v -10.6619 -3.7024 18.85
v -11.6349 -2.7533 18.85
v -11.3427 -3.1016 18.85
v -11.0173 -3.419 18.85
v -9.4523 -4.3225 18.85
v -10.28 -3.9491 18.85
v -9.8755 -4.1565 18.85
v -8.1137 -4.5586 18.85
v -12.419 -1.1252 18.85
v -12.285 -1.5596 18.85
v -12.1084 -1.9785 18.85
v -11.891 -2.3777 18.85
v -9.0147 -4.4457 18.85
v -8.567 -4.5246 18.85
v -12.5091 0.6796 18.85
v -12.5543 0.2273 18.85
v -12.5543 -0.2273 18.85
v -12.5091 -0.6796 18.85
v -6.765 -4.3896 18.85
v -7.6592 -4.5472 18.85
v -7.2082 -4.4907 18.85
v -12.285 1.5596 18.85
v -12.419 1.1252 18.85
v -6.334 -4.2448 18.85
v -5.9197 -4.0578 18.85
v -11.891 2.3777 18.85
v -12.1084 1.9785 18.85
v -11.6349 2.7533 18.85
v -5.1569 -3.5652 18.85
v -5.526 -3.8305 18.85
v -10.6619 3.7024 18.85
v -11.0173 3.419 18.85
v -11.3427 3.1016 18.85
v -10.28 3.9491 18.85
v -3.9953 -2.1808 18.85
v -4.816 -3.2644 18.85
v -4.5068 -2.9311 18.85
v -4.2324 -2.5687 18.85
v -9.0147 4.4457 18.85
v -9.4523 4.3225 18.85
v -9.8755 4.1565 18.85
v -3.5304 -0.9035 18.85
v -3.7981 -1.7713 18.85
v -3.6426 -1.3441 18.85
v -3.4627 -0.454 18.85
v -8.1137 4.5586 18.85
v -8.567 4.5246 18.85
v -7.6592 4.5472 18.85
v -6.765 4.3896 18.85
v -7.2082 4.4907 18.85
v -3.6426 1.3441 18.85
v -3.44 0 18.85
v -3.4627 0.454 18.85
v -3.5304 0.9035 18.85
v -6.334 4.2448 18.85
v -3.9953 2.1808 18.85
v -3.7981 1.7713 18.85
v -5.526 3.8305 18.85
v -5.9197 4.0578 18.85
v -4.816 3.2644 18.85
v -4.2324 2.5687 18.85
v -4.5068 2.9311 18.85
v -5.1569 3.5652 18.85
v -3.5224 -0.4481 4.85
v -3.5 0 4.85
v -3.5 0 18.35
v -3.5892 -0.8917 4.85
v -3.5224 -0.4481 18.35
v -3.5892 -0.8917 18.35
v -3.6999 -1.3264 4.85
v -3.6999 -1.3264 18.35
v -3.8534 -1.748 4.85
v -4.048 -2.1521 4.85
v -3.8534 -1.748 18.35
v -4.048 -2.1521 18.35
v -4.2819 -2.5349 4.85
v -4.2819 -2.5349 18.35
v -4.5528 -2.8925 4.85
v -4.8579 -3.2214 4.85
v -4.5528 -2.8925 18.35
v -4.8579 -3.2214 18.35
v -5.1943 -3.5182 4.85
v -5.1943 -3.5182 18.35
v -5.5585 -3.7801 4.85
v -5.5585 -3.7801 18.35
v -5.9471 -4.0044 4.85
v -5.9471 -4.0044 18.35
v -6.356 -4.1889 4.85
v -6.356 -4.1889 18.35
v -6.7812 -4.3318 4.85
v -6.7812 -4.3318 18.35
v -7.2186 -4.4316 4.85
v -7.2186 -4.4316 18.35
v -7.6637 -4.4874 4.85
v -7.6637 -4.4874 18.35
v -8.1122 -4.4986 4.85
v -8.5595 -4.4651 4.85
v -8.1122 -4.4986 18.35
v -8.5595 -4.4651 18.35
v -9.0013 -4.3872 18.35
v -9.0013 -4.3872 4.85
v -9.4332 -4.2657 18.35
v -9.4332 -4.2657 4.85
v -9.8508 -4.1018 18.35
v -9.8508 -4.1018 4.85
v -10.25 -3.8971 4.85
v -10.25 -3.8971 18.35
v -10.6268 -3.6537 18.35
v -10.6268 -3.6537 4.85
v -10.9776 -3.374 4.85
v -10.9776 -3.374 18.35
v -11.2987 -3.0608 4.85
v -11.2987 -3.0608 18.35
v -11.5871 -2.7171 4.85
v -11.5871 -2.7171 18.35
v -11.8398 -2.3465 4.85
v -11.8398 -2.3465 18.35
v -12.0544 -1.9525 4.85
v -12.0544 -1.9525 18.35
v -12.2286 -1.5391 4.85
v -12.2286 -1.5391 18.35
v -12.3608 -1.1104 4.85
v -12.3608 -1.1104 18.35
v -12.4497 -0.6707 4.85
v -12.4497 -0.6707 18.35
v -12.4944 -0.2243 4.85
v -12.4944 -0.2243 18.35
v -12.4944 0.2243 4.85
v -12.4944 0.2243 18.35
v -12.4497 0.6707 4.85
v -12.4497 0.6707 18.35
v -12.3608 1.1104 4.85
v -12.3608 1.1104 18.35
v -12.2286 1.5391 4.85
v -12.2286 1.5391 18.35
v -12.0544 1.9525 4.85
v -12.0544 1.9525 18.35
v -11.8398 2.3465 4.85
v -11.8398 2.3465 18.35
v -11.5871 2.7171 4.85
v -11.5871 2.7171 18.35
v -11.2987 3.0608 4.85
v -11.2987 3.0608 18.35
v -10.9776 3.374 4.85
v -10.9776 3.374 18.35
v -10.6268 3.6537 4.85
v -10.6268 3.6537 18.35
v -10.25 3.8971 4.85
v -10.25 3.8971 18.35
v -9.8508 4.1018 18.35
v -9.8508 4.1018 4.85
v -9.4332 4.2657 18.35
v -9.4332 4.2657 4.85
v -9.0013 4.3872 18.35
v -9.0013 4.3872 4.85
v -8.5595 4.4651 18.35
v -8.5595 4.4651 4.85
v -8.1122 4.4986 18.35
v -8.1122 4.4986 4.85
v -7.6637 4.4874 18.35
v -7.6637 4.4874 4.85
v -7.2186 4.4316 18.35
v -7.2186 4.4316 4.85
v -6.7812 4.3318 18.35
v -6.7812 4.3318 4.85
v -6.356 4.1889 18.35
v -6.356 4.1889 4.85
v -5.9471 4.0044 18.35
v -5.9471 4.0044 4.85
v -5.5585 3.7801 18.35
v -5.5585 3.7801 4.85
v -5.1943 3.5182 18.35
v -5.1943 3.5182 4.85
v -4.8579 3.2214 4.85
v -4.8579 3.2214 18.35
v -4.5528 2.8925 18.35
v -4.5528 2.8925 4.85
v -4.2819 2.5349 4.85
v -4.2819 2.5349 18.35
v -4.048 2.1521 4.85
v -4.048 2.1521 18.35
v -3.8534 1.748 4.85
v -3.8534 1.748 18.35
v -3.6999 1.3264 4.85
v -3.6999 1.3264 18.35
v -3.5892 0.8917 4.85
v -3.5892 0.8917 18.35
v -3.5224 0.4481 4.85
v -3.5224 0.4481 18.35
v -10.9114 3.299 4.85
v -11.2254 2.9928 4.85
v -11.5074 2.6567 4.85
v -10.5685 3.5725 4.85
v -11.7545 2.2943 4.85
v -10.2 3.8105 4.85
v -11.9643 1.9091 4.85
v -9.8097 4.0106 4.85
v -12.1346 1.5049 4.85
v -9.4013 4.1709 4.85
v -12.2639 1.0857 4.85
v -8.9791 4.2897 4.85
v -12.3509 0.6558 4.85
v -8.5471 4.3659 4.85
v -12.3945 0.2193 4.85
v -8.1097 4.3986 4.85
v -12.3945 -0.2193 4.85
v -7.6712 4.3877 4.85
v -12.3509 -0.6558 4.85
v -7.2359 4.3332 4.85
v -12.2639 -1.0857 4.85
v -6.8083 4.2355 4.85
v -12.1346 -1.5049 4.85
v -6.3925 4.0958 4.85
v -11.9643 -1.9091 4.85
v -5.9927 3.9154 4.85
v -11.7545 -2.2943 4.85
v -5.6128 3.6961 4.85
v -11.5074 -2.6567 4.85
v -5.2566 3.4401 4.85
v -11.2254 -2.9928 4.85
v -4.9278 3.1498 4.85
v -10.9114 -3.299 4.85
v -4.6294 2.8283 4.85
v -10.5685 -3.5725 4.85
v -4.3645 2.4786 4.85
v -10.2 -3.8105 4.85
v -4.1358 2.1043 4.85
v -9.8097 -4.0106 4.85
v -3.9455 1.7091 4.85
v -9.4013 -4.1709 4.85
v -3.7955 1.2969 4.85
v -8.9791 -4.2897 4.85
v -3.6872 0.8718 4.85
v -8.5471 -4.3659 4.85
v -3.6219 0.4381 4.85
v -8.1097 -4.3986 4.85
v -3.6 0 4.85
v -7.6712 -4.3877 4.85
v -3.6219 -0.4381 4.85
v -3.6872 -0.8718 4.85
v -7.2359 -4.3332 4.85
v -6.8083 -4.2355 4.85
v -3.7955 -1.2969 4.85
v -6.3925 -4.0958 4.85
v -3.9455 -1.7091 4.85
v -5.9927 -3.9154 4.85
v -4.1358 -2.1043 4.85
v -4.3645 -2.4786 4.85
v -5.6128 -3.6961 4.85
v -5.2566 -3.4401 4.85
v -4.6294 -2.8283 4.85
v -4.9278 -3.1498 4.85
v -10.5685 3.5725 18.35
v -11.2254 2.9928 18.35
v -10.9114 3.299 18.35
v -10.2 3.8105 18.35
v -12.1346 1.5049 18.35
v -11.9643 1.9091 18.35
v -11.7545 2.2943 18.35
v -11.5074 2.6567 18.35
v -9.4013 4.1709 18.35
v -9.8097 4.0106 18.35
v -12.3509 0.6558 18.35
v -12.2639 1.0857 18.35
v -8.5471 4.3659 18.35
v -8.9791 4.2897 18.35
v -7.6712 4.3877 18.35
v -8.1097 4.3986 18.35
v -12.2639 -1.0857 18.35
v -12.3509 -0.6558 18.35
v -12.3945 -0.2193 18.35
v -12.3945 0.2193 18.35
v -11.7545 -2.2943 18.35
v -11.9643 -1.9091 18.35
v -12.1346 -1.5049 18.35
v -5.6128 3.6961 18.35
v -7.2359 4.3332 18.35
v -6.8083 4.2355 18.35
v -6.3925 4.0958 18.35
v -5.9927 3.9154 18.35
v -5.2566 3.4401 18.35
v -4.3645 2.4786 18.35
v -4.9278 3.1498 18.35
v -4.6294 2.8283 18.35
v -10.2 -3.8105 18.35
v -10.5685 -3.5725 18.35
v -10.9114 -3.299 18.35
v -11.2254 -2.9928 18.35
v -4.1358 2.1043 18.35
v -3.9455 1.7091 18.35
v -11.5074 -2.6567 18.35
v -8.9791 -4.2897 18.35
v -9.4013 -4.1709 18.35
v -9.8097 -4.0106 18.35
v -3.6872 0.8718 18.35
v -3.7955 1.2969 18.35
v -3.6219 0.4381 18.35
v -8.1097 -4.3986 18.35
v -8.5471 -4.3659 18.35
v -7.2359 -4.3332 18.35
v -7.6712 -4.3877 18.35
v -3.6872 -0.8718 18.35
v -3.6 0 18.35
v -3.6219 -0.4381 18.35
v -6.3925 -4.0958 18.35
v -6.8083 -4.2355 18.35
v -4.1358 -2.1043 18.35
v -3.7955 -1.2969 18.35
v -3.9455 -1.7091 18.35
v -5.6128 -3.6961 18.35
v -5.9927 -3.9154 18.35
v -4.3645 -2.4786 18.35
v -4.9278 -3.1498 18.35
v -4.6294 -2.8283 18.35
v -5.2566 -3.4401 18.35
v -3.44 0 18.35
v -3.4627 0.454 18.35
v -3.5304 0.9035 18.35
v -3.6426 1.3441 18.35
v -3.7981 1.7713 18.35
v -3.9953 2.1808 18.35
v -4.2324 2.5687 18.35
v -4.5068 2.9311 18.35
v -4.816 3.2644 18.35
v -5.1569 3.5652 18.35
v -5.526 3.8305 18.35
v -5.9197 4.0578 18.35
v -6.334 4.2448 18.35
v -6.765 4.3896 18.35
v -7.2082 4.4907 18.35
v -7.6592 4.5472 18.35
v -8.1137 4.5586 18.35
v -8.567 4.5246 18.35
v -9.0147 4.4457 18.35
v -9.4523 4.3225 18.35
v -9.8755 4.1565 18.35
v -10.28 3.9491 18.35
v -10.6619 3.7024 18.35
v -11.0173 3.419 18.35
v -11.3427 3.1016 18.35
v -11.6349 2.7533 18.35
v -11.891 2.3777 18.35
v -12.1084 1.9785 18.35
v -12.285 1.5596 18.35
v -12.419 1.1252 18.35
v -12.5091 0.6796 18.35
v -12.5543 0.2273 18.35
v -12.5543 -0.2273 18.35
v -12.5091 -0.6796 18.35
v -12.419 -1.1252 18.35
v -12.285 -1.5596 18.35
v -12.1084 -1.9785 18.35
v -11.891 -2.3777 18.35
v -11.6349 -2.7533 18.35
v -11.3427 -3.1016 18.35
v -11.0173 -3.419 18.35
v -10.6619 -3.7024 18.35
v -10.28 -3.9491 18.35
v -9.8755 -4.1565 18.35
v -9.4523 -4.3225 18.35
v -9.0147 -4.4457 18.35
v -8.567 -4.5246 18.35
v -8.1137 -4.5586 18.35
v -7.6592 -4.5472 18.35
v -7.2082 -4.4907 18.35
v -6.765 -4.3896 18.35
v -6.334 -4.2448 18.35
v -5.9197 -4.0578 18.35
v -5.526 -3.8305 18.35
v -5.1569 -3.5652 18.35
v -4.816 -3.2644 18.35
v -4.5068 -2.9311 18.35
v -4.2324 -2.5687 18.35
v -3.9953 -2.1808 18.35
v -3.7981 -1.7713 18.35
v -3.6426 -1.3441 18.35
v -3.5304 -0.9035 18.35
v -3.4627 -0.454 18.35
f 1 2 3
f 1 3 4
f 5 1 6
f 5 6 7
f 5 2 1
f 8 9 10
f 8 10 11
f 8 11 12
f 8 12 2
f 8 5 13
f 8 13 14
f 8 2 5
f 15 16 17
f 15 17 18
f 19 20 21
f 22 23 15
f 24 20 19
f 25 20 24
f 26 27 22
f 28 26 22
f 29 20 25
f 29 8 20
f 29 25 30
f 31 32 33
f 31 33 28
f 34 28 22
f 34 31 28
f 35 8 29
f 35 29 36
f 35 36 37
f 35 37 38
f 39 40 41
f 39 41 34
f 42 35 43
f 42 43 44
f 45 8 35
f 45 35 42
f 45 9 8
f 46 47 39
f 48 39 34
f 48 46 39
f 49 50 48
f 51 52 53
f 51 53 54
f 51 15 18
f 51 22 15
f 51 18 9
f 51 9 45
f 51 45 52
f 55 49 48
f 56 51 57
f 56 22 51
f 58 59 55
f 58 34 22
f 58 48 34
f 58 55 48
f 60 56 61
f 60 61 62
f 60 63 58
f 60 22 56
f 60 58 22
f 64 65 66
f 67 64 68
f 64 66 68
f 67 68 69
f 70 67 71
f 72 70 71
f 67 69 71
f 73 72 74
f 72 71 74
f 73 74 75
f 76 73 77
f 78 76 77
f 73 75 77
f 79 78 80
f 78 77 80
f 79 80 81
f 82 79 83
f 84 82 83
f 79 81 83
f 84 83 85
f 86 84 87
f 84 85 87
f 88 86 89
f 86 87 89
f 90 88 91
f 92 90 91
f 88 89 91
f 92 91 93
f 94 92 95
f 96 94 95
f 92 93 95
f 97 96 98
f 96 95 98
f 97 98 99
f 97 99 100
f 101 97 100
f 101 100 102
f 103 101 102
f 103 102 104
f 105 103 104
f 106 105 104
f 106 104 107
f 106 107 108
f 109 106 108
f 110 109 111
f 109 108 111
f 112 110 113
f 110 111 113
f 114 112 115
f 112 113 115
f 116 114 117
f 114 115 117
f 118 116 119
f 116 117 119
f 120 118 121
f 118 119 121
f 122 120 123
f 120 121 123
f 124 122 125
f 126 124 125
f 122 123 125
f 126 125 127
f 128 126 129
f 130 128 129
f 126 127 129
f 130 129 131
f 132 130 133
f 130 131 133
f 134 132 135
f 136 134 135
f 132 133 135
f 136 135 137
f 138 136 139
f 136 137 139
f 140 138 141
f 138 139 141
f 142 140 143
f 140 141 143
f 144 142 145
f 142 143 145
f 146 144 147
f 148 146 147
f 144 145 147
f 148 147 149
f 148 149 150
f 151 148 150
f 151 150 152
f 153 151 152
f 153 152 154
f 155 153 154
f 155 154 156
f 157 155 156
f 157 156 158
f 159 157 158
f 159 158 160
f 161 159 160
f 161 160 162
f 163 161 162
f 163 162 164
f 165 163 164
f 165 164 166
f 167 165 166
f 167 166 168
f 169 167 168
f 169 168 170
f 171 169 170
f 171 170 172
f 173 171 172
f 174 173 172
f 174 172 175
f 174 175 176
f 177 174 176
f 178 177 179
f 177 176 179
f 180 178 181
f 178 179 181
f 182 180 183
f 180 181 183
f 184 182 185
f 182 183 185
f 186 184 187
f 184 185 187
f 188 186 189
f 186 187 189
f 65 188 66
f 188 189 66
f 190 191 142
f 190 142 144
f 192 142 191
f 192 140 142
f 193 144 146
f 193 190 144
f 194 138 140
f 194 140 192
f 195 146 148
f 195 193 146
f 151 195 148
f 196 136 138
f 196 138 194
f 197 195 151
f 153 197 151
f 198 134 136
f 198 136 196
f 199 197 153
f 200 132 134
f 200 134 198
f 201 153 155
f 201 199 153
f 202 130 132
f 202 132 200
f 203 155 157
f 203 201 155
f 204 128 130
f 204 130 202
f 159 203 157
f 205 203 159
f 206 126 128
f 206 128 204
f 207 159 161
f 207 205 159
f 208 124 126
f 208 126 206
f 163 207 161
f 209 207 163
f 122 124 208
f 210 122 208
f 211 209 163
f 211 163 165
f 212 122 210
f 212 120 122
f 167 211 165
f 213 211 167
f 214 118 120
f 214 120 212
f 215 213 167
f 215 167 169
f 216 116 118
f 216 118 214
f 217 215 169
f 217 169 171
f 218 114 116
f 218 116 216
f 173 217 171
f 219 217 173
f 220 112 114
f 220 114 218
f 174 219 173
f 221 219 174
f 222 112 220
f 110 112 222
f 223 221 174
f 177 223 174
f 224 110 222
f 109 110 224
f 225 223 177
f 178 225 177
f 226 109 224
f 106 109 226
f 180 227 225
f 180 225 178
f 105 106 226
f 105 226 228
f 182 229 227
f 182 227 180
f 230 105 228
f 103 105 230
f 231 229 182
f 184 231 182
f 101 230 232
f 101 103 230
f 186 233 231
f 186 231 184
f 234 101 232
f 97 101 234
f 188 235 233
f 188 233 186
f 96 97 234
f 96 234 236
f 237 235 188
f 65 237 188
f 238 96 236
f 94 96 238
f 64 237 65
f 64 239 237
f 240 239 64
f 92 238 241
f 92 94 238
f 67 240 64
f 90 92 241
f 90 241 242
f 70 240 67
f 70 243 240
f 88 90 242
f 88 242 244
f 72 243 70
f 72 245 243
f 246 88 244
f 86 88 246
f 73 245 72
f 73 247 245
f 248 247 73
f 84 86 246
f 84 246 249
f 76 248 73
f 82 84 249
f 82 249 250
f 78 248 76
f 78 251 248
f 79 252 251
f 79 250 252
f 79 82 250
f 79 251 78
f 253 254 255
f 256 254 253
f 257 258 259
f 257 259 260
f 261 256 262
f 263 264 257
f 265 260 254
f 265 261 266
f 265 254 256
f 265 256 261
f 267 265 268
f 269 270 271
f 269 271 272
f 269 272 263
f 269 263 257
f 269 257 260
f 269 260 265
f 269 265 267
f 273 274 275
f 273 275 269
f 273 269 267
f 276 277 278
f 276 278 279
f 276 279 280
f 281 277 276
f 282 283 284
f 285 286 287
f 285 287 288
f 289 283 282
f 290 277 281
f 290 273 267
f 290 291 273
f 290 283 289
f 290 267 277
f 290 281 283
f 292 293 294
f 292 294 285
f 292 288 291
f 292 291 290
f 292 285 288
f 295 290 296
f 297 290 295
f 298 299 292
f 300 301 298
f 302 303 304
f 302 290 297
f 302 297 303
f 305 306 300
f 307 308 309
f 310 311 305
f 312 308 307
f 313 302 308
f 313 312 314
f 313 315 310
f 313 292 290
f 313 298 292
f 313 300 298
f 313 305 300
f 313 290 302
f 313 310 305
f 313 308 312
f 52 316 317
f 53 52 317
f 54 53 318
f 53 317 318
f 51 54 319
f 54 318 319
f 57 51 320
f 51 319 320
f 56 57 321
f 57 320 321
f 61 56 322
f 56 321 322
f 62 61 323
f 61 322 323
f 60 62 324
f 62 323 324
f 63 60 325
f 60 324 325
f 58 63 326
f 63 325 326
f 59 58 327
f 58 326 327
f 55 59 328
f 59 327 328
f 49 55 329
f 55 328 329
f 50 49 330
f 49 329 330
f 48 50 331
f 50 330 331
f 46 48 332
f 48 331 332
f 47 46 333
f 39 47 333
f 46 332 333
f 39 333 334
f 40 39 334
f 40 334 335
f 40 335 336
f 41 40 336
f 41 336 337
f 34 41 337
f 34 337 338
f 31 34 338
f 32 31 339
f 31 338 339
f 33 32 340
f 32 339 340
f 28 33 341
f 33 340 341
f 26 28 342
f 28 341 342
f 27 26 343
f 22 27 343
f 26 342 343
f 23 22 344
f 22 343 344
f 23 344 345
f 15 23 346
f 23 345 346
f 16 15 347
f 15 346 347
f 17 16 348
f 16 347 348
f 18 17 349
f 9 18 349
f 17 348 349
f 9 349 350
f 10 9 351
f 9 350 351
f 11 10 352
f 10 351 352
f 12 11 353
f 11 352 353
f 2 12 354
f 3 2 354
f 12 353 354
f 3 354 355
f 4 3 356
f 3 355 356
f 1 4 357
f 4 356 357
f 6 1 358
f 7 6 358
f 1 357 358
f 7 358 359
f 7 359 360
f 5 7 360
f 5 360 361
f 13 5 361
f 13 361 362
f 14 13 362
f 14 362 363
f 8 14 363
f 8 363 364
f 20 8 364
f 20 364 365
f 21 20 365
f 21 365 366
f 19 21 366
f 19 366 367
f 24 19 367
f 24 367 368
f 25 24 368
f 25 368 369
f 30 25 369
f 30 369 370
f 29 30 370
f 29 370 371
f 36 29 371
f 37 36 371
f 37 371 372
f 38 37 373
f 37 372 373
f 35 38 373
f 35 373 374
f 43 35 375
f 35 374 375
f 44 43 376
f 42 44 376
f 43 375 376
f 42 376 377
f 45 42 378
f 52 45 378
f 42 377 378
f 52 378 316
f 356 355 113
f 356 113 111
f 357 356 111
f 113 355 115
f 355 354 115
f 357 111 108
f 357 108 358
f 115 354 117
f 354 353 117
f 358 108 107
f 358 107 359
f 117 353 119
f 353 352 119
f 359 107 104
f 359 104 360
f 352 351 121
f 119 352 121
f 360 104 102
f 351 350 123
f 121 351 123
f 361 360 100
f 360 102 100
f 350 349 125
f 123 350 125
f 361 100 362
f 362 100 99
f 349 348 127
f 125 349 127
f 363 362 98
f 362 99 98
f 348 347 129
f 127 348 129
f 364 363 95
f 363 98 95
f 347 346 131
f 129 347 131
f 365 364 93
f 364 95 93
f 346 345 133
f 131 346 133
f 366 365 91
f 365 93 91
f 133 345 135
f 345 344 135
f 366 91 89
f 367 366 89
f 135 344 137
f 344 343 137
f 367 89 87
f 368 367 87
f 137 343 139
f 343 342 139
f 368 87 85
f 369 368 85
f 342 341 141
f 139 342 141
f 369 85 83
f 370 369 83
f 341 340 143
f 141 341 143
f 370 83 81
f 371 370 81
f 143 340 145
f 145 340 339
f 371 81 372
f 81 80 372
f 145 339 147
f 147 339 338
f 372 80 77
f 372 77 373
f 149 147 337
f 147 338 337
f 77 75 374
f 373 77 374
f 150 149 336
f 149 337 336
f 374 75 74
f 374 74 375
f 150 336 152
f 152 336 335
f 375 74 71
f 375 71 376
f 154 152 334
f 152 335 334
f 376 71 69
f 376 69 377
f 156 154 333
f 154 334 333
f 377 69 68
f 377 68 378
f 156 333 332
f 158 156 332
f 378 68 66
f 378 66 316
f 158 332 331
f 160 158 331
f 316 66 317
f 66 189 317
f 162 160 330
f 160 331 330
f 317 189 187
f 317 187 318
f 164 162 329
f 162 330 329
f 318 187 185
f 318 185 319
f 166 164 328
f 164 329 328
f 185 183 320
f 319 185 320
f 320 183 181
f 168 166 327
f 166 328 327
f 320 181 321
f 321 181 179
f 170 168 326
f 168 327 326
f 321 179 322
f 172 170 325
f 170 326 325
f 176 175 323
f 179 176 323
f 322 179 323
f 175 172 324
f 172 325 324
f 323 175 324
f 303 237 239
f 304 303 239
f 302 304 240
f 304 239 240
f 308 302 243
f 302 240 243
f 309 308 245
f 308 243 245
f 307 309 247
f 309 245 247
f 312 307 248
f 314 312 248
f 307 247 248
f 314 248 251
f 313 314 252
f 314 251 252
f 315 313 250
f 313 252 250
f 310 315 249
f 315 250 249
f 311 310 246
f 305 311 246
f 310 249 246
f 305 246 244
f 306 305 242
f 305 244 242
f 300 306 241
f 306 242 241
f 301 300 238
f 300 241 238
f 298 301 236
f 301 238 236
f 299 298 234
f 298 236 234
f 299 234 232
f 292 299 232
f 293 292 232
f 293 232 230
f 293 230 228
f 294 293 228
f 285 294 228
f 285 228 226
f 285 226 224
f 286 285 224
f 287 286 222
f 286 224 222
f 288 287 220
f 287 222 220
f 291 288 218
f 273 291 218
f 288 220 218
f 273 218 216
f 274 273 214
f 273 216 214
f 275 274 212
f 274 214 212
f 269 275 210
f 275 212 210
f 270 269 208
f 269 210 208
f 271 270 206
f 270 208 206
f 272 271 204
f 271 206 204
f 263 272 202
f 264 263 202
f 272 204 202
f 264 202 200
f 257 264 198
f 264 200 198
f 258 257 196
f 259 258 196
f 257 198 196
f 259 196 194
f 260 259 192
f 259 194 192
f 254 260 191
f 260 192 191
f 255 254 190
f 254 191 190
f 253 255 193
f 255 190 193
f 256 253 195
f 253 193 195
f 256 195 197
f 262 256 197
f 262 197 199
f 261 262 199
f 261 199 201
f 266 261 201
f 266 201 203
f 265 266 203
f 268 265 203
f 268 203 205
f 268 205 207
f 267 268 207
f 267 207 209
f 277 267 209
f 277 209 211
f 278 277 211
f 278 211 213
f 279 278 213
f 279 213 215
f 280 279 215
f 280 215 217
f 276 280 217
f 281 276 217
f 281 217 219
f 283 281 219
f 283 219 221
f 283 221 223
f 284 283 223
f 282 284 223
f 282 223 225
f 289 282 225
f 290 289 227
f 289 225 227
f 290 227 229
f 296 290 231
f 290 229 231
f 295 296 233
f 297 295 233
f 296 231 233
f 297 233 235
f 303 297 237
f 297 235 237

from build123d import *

# Parameters (mm, degrees)
CYLINDER_R      = 4.1
CYLINDER_DEPTH  = 3.1
SKETCH005_R     = 4.56
PAD002_DEPTH    = 0.5
SKETCH006_R     = 4.5
PAD003_DEPTH    = 13.5
SKETCH007_R     = 4.4
POCKET003_DEPTH = 13.5


with BuildPart() as part:
    # Cylinder → Cylinder (new body)
    with BuildSketch(Plane(origin=(-8, 0, 15.25), x_dir=(1, 0, 0), z_dir=(0, 0, 1))):
        Circle(CYLINDER_R)
    extrude(amount=CYLINDER_DEPTH)

    # Sketch005 → Pad002 (new body)
    with BuildSketch(Plane(origin=(-8, 0, 18.35), x_dir=(1, 0, 0), z_dir=(0, 0, 1))):
        Circle(SKETCH005_R)
    extrude(amount=PAD002_DEPTH)

    # Sketch006 → Pad003 (new body)
    with BuildSketch(Plane(origin=(-8, 0, 18.35), x_dir=(1, 0, 0), z_dir=(0, 0, -1))):
        Circle(SKETCH006_R)
    extrude(amount=PAD003_DEPTH)

    # Sketch007 → Pocket003 (cut)
    with BuildSketch(Plane(origin=(-8, 0, 4.85), x_dir=(1, 0, 0), z_dir=(0, 0, -1))):
        Circle(SKETCH007_R)
    extrude(amount=-POCKET003_DEPTH, mode=Mode.SUBTRACT)


solid = part.part
